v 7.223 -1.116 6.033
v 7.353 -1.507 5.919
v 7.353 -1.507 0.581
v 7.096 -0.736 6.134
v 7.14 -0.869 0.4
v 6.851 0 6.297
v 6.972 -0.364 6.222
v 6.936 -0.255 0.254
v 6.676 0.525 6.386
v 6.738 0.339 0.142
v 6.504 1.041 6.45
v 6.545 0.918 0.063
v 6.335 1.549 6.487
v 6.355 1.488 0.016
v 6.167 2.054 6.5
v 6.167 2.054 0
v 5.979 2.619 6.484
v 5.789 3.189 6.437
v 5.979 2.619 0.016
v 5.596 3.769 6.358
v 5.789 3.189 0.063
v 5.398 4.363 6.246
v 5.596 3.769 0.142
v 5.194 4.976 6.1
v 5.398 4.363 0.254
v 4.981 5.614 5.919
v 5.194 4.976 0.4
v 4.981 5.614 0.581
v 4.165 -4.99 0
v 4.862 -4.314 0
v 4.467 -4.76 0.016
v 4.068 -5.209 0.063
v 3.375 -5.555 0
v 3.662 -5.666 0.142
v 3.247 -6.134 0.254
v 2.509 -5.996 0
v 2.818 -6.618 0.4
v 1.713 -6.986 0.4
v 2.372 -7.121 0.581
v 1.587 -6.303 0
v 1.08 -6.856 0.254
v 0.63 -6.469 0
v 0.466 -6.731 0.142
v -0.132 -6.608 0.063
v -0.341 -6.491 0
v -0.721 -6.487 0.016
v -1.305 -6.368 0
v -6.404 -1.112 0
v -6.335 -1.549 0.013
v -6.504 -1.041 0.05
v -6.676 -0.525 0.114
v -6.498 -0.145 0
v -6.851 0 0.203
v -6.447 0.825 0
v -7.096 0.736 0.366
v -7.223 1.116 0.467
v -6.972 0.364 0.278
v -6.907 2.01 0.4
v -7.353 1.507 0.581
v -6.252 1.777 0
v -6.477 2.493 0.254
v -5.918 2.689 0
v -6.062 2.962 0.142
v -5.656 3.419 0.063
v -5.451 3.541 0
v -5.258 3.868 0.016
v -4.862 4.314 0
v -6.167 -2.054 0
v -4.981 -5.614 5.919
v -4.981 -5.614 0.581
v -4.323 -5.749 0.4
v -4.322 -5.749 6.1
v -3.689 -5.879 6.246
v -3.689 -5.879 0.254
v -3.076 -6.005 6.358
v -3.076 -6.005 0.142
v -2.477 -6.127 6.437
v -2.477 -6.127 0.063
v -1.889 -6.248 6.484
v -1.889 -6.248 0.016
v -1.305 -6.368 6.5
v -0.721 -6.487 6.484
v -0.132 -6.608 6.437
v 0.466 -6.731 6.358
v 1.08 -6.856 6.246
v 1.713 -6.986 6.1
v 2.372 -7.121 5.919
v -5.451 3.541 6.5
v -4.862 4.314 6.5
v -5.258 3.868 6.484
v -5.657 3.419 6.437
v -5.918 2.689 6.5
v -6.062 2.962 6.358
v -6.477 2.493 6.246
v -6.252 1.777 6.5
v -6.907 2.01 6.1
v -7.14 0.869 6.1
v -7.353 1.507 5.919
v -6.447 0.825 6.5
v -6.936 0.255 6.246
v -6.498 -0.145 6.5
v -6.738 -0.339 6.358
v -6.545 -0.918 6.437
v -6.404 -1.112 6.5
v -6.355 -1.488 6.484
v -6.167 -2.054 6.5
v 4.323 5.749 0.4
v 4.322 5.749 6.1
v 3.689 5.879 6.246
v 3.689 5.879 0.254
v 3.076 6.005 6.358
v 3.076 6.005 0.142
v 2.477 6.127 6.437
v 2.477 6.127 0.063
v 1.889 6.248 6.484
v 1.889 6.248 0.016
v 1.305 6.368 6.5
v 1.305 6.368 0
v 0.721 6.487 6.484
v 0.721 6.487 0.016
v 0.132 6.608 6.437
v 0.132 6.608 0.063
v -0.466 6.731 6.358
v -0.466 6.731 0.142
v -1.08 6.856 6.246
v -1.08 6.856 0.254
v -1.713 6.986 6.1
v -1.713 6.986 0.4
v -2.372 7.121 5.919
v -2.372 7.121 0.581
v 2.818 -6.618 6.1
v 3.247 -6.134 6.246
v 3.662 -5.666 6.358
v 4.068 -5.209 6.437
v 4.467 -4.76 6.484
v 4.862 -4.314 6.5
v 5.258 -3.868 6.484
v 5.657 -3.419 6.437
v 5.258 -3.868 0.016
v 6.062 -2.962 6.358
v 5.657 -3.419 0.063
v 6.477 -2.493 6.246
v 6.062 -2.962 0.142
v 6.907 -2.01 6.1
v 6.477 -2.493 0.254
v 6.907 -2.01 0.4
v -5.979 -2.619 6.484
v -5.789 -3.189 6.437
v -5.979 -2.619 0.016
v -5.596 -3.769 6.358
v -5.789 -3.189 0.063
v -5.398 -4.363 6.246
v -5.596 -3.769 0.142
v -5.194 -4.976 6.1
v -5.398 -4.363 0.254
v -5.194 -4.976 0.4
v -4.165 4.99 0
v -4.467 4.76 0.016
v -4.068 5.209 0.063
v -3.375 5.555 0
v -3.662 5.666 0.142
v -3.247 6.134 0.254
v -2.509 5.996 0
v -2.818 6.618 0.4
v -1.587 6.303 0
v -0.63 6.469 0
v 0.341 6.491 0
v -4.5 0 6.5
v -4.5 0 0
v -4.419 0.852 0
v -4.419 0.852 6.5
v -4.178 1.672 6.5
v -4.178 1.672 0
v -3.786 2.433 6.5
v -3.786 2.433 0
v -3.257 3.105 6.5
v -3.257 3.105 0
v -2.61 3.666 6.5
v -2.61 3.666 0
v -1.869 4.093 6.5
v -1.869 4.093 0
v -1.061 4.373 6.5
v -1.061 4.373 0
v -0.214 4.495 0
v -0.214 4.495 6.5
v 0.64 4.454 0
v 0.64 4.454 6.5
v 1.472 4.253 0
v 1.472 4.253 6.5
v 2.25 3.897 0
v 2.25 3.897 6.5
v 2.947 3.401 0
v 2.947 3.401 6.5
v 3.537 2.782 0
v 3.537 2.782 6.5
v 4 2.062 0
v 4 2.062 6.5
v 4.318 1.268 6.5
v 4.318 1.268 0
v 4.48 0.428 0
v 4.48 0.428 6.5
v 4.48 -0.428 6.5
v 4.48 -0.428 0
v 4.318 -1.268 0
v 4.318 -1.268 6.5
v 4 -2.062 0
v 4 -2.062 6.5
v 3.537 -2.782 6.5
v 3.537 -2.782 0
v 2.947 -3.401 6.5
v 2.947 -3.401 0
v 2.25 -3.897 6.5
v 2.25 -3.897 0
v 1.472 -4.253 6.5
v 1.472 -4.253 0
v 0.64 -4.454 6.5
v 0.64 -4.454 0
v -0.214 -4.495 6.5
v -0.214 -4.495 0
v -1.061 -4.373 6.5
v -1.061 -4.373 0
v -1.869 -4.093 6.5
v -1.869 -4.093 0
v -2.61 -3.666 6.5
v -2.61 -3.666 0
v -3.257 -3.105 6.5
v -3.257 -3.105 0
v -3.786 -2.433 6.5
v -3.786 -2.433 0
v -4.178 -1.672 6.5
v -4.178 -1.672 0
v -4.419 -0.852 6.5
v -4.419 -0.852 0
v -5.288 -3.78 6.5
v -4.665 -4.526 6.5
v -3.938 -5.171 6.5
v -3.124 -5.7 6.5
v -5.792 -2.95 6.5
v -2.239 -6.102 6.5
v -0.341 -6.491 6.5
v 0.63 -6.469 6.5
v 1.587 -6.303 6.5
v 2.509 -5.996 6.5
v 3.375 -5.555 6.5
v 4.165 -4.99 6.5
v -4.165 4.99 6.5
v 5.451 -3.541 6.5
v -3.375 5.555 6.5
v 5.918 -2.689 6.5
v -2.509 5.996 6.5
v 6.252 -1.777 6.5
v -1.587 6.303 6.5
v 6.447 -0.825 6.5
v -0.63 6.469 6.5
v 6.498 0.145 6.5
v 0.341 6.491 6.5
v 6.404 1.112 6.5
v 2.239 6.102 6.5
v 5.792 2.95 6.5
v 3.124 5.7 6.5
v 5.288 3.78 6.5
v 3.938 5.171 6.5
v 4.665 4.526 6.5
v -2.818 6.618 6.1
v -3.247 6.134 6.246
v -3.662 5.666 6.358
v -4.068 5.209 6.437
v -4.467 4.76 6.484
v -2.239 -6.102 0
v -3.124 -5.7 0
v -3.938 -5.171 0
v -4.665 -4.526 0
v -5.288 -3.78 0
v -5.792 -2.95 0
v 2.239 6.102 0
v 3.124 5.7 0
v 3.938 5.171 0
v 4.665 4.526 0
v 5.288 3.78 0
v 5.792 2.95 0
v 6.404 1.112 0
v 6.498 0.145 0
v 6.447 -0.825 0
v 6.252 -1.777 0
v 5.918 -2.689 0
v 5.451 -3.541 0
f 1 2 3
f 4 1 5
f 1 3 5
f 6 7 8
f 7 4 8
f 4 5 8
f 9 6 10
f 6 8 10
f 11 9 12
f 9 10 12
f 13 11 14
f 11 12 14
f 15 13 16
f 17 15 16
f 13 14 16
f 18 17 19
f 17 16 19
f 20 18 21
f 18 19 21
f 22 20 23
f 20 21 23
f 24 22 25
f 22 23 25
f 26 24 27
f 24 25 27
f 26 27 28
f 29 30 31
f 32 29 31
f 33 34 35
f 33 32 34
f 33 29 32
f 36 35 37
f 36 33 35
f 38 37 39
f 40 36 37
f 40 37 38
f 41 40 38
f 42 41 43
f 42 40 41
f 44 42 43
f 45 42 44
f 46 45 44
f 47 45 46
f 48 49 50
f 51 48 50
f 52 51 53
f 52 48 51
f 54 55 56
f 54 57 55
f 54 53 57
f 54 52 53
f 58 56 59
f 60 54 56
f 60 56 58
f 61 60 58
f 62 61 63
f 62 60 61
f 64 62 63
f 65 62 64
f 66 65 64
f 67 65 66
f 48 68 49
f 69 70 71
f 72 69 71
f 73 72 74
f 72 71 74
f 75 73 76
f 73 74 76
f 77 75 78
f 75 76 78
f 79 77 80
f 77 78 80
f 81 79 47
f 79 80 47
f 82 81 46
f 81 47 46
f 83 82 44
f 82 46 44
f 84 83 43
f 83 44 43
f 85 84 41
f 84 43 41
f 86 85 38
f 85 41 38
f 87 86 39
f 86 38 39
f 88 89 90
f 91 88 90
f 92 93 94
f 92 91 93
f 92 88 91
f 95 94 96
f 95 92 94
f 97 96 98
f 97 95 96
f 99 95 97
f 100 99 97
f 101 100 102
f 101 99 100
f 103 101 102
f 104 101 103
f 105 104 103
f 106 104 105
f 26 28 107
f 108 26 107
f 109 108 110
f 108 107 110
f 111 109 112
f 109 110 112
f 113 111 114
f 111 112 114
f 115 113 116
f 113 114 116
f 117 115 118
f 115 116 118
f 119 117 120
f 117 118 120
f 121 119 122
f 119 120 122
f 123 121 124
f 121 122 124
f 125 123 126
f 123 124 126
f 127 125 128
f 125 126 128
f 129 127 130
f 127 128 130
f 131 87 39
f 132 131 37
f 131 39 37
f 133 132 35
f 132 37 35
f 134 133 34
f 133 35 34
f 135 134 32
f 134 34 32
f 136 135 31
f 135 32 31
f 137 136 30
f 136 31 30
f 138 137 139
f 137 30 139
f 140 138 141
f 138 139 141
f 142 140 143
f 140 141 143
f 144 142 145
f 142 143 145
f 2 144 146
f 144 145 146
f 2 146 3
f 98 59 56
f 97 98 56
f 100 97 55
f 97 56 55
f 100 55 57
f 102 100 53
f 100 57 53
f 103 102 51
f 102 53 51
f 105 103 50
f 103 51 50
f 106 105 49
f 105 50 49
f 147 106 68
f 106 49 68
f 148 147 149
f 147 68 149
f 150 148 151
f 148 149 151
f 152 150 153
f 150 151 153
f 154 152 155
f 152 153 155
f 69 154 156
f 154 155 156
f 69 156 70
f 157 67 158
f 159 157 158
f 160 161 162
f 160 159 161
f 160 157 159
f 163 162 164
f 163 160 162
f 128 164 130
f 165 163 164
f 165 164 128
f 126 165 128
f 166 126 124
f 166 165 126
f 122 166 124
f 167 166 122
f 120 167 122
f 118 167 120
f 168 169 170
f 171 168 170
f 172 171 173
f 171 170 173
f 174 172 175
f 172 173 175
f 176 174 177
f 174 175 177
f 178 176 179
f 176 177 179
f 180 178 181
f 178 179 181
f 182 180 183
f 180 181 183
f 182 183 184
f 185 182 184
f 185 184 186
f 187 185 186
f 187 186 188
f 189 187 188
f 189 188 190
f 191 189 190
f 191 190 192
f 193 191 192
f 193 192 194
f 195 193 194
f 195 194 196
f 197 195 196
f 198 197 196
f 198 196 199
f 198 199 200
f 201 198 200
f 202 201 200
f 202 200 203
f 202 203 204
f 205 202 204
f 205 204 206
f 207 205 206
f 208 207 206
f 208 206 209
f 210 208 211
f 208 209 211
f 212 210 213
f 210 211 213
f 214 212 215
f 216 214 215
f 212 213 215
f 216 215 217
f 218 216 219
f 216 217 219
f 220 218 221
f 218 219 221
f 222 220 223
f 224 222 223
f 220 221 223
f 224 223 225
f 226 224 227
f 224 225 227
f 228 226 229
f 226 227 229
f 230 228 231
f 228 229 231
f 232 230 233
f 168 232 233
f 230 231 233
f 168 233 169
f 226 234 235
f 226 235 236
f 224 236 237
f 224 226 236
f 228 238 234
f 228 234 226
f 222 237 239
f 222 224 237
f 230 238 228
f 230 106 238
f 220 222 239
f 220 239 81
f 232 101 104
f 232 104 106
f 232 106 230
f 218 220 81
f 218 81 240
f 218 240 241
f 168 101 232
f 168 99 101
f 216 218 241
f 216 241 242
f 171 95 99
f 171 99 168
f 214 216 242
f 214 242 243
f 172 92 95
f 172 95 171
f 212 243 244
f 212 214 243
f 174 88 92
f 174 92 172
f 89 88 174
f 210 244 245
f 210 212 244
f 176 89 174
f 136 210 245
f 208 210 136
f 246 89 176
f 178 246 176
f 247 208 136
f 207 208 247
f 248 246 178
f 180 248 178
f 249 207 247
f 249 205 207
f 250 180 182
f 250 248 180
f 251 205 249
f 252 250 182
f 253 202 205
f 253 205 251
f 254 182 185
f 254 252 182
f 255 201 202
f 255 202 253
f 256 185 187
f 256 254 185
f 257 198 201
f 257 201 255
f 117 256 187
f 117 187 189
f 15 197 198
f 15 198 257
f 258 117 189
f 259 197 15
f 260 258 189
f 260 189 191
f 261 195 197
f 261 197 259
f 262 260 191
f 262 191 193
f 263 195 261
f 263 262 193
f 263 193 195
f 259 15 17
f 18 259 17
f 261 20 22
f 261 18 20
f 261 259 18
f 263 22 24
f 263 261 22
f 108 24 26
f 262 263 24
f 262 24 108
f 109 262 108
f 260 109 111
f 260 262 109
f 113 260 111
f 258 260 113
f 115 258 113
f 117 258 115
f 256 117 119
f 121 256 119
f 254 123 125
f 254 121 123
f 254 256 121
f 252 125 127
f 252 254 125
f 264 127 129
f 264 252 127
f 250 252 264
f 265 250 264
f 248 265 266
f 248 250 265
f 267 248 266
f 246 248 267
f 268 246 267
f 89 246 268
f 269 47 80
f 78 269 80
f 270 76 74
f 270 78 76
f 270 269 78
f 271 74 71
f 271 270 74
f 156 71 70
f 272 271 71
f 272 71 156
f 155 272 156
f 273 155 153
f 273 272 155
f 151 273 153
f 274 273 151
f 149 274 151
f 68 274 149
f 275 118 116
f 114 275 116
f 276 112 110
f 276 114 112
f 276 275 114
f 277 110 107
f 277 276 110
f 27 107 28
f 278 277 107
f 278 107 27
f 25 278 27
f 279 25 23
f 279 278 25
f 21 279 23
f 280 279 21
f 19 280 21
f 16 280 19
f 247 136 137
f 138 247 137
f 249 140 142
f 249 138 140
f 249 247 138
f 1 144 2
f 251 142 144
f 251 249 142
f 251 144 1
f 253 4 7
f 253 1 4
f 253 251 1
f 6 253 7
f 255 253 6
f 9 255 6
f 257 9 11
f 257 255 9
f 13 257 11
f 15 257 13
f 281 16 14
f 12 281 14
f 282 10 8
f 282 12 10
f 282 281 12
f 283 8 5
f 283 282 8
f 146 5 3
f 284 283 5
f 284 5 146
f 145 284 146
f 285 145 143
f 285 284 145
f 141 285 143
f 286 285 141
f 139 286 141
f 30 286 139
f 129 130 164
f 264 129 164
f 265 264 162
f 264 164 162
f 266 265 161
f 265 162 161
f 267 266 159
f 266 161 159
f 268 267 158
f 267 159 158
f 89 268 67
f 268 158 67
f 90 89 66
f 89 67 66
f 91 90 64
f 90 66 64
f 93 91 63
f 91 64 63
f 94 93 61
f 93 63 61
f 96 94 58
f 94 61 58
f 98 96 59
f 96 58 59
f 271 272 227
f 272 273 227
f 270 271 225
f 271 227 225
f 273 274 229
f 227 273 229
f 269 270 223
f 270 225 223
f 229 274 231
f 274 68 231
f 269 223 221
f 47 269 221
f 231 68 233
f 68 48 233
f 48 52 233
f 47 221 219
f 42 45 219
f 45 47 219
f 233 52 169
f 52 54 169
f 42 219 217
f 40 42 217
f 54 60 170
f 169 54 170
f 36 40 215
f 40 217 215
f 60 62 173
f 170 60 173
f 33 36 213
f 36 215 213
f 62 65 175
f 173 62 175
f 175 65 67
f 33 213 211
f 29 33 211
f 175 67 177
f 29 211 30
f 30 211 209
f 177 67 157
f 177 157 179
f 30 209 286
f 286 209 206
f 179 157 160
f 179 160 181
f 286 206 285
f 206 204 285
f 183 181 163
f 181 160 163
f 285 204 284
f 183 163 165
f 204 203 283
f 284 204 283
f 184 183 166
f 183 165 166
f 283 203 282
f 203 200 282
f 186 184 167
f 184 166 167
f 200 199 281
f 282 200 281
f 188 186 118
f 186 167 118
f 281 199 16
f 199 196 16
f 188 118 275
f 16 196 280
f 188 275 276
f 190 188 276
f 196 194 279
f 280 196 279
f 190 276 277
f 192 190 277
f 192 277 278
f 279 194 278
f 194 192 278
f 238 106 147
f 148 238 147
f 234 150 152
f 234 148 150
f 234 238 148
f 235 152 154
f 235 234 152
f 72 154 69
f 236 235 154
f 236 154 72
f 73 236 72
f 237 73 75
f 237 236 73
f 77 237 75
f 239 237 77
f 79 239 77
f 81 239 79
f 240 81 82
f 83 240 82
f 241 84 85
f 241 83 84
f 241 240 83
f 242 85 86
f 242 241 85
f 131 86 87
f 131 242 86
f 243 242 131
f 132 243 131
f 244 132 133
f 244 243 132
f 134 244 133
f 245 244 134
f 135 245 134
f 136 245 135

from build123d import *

# Parameters (mm, degrees)
BOSS_EXTRUDE1_DEPTH = 6.5
SKETCH2_OUTSIDE_W   = 43.518
SKETCH2_OUTSIDE_H   = 43.054
SKETCH2_OUTSIDE_R   = 6.5
CUT_EXTRUDE1_DEPTH  = 6.5
CUT_EXTRUDE1_DRAFT  = -60
SKETCH3_OUTSIDE_W   = 43.518
SKETCH3_OUTSIDE_H   = 43.054
SKETCH3_OUTSIDE_R   = 6.5
CUT_EXTRUDE2_DEPTH  = 6.5
CUT_EXTRUDE2_DRAFT  = -60
SKETCH4_R           = 4.5
CUT_EXTRUDE3_DEPTH  = 13.125271319


with BuildPart() as part:
    # Sketch1 → Boss-Extrude1 (new body)
    with BuildSketch(Plane.XY):
        Polygon((4.981175881, 5.614376205), (-2.371604479, 7.121012956), (-7.352780361, 1.506636751), (-4.981175881, -5.614376205), (2.371604479, -7.121012956), (7.352780361, -1.506636751), align=None)
    extrude(amount=BOSS_EXTRUDE1_DEPTH)


with BuildPart() as cut_extrude1_tool:
    # Sketch2 outside → Cut-Extrude1 (with draft: the straight prism first)
    with BuildSketch(Plane.XY.offset(6.5)):
        Rectangle(SKETCH2_OUTSIDE_W, SKETCH2_OUTSIDE_H)
        Circle(SKETCH2_OUTSIDE_R, mode=Mode.SUBTRACT)
    extrude(amount=-CUT_EXTRUDE1_DEPTH)
    # Cut-Extrude1: the draft: its side faces are tilted about the plane it starts from
    cut_extrude1_sides = [cut_extrude1_tool.faces().sort_by_distance(p)[0] for p in [
        (0, -21.527, 3.25),
        (21.759, 0, 3.25),
        (0, 21.527, 3.25),
        (-21.759, 0, 3.25),
        (-6.5, 0, 3.25),
    ]]
    draft(cut_extrude1_sides, Plane.XY.offset(6.5), CUT_EXTRUDE1_DRAFT)


with BuildPart() as part_1:
    add(part.part)

    # Cut-Extrude1: cut by cut_extrude1_tool
    add(cut_extrude1_tool.part, mode=Mode.SUBTRACT)


with BuildPart() as cut_extrude2_tool:
    # Sketch3 outside → Cut-Extrude2 (with draft: the straight prism first)
    with BuildSketch(Plane(origin=(0, 0, 0), x_dir=(-1, 0, 0), z_dir=(0, 0, -1))):
        Rectangle(SKETCH3_OUTSIDE_W, SKETCH3_OUTSIDE_H)
        Circle(SKETCH3_OUTSIDE_R, mode=Mode.SUBTRACT)
    extrude(amount=-CUT_EXTRUDE2_DEPTH)
    # Cut-Extrude2: the draft: its side faces are tilted about the plane it starts from
    cut_extrude2_sides = [cut_extrude2_tool.faces().sort_by_distance(p)[0] for p in [
        (0, -21.527, 3.25),
        (-21.759, 0, 3.25),
        (0, 21.527, 3.25),
        (21.759, 0, 3.25),
        (6.5, 0, 3.25),
    ]]
    draft(cut_extrude2_sides, Plane(origin=(0, 0, 0), x_dir=(-1, 0, 0), z_dir=(0, 0, -1)), CUT_EXTRUDE2_DRAFT)


with BuildPart() as part_2:
    add(part_1.part)

    # Cut-Extrude2: cut by cut_extrude2_tool
    add(cut_extrude2_tool.part, mode=Mode.SUBTRACT)

    # Sketch4 → Cut-Extrude3 (cut, through all)
    with BuildSketch(Plane(origin=(0, 0, 0), x_dir=(-1, 0, 0), z_dir=(0, 0, -1))):
        Circle(SKETCH4_R)
    extrude(amount=-CUT_EXTRUDE3_DEPTH, mode=Mode.SUBTRACT)


solid = part_2.part
